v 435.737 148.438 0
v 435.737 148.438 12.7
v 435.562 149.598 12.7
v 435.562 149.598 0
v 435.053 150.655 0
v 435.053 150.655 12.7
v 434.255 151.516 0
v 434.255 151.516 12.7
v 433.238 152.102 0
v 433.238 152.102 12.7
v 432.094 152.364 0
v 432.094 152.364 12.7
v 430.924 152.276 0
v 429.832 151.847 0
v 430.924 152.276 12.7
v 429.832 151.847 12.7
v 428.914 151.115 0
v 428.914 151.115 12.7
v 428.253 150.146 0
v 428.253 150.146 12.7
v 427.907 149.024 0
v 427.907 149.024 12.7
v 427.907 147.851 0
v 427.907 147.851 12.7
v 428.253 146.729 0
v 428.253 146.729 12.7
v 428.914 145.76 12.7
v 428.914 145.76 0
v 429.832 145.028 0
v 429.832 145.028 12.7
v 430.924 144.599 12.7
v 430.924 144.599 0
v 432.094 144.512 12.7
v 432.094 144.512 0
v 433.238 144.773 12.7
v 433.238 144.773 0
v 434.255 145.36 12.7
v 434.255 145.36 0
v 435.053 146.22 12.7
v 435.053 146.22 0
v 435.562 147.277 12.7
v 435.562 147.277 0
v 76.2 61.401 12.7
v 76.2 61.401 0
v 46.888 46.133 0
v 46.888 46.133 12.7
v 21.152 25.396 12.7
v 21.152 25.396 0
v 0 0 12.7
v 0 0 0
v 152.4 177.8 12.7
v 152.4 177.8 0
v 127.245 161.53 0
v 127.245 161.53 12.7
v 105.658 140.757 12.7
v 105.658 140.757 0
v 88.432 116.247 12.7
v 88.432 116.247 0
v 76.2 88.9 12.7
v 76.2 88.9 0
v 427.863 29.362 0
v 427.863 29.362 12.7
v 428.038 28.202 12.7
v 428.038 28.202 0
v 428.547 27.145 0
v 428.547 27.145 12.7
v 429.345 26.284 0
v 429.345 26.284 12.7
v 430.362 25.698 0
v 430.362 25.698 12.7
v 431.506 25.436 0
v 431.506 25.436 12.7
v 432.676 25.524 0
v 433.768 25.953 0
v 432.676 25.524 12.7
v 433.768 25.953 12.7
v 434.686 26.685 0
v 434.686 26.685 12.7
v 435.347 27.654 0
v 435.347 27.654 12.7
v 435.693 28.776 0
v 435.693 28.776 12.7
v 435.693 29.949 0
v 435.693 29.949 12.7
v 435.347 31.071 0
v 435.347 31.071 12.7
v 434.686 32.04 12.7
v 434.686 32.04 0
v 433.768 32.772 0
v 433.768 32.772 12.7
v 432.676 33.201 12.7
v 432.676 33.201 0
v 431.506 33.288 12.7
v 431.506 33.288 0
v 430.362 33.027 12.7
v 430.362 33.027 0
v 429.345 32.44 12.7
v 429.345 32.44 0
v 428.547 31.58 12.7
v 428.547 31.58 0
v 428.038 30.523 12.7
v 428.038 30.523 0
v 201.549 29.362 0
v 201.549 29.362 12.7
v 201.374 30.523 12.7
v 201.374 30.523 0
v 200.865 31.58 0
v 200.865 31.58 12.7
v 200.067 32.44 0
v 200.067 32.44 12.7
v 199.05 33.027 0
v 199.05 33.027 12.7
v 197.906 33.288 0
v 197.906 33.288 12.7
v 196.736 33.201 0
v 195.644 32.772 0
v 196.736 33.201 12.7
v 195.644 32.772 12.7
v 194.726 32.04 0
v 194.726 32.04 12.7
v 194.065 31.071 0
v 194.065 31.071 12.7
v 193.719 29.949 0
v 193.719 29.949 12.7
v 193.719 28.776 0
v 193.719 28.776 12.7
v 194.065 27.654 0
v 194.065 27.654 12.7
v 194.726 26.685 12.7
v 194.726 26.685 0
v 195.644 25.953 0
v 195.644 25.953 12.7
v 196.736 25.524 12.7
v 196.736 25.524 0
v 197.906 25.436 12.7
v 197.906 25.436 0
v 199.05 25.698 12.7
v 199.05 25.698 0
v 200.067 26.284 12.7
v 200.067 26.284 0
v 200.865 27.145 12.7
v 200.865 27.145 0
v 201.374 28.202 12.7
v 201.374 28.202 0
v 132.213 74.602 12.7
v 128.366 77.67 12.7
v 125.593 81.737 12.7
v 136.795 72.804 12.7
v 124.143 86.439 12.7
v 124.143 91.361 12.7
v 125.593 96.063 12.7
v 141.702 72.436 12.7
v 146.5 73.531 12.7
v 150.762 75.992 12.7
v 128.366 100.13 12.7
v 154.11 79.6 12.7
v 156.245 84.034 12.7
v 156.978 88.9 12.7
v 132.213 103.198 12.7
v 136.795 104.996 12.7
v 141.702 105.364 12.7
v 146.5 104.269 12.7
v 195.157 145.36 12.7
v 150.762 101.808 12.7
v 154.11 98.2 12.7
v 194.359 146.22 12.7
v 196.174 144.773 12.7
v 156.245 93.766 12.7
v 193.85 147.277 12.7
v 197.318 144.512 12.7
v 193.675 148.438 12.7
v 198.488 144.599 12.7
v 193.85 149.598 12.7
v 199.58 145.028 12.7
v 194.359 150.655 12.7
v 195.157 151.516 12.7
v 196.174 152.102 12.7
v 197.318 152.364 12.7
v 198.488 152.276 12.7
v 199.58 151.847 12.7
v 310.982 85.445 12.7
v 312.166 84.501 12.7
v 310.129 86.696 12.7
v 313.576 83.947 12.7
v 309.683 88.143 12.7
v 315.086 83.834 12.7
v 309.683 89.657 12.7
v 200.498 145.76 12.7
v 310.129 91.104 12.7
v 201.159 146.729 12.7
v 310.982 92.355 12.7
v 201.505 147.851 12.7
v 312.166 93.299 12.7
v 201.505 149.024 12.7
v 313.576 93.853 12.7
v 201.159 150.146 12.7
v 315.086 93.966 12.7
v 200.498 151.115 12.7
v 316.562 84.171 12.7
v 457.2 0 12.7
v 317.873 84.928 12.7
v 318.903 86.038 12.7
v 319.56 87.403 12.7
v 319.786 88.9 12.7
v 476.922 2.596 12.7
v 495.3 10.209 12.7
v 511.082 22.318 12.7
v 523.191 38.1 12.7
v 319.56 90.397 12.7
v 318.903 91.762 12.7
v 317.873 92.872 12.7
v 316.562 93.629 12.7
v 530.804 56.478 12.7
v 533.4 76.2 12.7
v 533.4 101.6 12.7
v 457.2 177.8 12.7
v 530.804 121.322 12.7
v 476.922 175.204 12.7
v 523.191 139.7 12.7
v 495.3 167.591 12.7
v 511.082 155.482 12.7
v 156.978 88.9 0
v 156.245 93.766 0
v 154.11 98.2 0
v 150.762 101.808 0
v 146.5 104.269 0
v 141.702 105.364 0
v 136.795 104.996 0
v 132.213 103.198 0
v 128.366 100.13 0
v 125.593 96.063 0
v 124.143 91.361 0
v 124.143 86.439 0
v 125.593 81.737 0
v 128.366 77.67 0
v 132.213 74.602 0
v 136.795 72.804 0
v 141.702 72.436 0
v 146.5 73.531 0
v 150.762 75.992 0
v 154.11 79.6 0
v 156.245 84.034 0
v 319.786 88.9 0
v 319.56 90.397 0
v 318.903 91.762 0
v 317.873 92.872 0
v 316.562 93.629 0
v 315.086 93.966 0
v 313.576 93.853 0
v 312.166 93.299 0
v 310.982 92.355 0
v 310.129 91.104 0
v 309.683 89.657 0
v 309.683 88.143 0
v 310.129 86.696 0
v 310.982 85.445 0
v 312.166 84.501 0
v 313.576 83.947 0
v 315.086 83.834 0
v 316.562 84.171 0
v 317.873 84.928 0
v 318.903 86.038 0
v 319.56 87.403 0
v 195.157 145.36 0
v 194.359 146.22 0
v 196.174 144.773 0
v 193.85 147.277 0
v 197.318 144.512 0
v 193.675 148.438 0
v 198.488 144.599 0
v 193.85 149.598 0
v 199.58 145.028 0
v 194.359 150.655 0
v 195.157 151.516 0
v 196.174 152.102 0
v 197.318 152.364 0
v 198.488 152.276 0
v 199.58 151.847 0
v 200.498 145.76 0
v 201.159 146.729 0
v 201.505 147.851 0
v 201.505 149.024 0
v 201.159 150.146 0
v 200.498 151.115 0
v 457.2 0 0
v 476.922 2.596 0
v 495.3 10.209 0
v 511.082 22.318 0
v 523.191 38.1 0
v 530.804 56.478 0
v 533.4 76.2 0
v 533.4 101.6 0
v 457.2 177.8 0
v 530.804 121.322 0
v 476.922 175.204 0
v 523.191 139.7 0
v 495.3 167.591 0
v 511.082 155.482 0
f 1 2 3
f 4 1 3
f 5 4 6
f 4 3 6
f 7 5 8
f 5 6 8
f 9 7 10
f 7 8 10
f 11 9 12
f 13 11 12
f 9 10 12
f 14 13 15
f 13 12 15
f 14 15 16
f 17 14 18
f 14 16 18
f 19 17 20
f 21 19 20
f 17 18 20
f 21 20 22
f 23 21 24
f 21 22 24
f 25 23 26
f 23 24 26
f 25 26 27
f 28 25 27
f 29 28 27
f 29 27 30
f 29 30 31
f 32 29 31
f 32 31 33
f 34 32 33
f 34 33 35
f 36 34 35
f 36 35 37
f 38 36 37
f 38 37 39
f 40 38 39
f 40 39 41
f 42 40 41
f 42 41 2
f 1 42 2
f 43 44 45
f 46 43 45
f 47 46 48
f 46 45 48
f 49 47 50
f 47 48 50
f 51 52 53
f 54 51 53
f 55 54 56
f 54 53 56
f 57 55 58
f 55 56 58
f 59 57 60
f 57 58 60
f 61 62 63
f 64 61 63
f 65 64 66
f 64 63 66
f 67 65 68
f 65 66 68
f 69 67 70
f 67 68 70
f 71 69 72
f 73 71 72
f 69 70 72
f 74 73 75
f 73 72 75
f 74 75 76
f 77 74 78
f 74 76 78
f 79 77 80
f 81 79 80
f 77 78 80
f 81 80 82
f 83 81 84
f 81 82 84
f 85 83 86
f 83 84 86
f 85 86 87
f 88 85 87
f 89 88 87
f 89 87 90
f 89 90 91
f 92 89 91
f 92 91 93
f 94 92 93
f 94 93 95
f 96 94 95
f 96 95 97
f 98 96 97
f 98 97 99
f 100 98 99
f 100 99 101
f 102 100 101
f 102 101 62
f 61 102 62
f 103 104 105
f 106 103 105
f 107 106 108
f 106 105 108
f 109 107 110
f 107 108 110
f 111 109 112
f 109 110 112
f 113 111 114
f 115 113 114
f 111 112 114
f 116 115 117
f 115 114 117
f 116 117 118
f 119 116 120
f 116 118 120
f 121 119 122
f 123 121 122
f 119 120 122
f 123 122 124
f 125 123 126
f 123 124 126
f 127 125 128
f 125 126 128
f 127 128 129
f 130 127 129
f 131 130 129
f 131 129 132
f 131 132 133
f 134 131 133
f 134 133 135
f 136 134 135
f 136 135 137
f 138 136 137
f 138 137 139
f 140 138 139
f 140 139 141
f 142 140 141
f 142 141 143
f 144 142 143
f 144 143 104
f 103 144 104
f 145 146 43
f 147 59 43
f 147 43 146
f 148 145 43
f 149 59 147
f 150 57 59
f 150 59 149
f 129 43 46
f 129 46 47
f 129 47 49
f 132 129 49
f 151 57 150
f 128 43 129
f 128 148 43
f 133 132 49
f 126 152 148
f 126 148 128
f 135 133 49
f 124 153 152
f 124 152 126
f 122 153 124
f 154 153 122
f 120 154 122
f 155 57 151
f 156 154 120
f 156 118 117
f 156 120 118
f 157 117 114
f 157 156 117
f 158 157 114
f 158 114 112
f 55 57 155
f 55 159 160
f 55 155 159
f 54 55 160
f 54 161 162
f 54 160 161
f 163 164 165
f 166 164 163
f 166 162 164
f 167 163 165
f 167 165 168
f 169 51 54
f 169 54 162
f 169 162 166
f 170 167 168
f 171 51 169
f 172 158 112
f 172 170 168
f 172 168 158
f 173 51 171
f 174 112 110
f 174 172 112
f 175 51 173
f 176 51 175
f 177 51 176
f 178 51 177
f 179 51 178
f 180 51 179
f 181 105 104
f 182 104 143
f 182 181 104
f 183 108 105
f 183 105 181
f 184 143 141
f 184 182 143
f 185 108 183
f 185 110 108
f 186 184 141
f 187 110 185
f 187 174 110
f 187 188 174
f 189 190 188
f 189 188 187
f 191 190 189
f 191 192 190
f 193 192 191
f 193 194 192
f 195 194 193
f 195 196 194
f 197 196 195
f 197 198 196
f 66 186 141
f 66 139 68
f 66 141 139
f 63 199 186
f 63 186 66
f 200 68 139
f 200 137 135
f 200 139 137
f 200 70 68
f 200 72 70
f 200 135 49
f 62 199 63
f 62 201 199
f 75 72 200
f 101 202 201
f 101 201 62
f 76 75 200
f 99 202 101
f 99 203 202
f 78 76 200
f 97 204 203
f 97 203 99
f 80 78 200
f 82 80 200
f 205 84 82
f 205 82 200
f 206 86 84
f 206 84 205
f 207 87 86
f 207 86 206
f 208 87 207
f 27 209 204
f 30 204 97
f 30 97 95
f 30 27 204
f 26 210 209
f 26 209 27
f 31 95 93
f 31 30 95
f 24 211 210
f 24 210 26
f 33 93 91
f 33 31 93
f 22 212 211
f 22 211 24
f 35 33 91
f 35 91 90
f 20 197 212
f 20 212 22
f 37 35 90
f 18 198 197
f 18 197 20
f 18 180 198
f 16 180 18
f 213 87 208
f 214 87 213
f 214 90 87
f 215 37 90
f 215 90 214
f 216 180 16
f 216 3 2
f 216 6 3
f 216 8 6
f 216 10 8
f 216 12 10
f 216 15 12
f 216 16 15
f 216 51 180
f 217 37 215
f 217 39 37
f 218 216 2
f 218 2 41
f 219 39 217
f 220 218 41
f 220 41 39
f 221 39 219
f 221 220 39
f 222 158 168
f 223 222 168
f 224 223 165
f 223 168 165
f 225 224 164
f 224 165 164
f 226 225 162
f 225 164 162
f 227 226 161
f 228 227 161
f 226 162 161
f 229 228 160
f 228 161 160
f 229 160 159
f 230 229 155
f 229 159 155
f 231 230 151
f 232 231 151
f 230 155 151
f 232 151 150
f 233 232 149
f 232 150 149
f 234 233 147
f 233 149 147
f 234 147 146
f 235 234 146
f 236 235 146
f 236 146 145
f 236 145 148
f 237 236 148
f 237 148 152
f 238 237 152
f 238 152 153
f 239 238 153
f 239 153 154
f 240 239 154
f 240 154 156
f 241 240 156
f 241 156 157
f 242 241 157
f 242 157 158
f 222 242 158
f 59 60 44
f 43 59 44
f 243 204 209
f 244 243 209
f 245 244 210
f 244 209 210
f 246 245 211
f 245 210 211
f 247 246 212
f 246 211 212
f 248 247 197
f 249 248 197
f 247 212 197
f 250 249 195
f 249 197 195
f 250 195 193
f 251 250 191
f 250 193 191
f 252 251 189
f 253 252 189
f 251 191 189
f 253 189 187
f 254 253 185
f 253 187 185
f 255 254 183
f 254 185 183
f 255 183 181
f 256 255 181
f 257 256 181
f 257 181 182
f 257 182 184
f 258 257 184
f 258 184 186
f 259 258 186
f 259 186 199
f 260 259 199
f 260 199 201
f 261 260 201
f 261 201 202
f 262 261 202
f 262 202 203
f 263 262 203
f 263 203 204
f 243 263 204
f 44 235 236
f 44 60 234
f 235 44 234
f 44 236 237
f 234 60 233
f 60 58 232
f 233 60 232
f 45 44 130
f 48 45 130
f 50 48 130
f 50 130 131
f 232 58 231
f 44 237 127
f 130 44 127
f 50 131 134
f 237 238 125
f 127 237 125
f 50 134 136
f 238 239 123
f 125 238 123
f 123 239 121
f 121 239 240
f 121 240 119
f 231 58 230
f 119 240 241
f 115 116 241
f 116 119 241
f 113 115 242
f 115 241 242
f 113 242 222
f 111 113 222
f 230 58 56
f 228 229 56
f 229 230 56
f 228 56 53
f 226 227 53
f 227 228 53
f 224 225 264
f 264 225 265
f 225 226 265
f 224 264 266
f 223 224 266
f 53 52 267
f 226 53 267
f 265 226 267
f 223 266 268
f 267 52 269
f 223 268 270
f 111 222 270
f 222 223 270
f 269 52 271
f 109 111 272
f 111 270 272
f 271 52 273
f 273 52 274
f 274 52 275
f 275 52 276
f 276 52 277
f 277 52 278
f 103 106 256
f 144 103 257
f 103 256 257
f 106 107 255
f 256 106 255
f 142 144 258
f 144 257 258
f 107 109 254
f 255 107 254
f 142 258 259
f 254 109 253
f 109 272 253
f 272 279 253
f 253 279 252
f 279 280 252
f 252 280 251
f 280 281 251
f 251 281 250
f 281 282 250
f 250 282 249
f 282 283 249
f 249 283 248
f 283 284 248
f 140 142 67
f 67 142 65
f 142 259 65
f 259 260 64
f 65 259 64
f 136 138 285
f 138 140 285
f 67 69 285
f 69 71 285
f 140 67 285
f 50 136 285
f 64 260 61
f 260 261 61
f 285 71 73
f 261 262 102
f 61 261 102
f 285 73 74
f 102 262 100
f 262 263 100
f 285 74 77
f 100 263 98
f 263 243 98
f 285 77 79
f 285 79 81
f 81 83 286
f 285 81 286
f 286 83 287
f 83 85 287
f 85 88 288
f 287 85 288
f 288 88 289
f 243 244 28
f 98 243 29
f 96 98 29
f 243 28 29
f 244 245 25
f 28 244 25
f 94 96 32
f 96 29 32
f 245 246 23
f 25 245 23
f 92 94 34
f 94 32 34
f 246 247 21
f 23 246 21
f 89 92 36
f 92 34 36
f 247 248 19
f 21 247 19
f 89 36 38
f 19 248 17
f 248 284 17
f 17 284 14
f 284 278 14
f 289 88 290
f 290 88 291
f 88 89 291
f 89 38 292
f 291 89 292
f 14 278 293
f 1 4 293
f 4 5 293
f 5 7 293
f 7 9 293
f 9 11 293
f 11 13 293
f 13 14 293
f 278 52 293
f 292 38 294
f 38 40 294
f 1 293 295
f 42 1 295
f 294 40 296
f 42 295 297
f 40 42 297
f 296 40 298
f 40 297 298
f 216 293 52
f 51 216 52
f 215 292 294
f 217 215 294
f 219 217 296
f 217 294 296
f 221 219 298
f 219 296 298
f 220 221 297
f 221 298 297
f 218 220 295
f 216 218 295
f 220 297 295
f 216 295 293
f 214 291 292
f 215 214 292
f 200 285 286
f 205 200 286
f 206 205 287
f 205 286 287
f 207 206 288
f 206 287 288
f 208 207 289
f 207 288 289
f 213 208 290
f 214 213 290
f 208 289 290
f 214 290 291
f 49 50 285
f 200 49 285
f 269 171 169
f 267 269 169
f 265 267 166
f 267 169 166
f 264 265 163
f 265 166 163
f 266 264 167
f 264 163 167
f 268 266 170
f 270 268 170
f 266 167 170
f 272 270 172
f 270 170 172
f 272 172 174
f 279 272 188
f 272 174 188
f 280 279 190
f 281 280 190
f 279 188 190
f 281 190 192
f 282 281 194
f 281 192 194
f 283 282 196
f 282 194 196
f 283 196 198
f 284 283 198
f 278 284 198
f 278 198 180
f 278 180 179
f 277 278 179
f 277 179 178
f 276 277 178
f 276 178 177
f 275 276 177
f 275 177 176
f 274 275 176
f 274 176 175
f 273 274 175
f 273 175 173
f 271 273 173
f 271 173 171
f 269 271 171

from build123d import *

# Parameters (mm, degrees)
BOSS_EXTRUDE1_DEPTH = 12.7
SKETCH4_R           = 5.08
SKETCH4_R_2         = 3.937
SKETCH4_R_3         = 16.51
CUT_EXTRUDE2_DEPTH  = 563.396381567


with BuildPart() as part:
    # Sketch2 → Boss-Extrude1 (new body)
    with BuildSketch(Plane.XY):
        with BuildLine():
            Line((0, 0), (457.2, 0))
            ThreePointArc((457.2, 0), (511.081536726, 22.318463274), (533.4, 76.2))
            Line((533.4, 76.2), (533.4, 101.6))
            ThreePointArc((533.4, 101.6), (511.081536726, 155.481536726), (457.2, 177.8))
            Line((457.2, 177.8), (152.4, 177.8))
            ThreePointArc((152.4, 177.8), (105.657968509, 140.757455564), (76.2, 88.9))
            Line((76.2, 88.9), (76.2, 61.401251199))
            ThreePointArc((76.2, 61.401251199), (33.506060073, 36.401783403), (0, 0))
        make_face()
    extrude(amount=BOSS_EXTRUDE1_DEPTH)

    # Sketch4 → Cut-Extrude2 (cut, through all)
    with BuildSketch(Plane.XY.offset(12.7)):
        with Locations((314.706, 88.9)):
            Circle(SKETCH4_R)
        with Locations((431.8, 148.4376)):
            Circle(SKETCH4_R_2)
        with Locations((140.468339853, 88.9)):
            Circle(SKETCH4_R_3)
        with Locations(Location((197.612, 148.4376, 0), (0, 0, 180))):
            Circle(SKETCH4_R_2)
        with Locations((197.612, 29.3624)):
            Circle(SKETCH4_R_2)
        with Locations(Location((431.8, 29.3624, 0), (0, 0, 180))):
            Circle(SKETCH4_R_2)
    extrude(amount=-CUT_EXTRUDE2_DEPTH, mode=Mode.SUBTRACT)


solid = part.part
